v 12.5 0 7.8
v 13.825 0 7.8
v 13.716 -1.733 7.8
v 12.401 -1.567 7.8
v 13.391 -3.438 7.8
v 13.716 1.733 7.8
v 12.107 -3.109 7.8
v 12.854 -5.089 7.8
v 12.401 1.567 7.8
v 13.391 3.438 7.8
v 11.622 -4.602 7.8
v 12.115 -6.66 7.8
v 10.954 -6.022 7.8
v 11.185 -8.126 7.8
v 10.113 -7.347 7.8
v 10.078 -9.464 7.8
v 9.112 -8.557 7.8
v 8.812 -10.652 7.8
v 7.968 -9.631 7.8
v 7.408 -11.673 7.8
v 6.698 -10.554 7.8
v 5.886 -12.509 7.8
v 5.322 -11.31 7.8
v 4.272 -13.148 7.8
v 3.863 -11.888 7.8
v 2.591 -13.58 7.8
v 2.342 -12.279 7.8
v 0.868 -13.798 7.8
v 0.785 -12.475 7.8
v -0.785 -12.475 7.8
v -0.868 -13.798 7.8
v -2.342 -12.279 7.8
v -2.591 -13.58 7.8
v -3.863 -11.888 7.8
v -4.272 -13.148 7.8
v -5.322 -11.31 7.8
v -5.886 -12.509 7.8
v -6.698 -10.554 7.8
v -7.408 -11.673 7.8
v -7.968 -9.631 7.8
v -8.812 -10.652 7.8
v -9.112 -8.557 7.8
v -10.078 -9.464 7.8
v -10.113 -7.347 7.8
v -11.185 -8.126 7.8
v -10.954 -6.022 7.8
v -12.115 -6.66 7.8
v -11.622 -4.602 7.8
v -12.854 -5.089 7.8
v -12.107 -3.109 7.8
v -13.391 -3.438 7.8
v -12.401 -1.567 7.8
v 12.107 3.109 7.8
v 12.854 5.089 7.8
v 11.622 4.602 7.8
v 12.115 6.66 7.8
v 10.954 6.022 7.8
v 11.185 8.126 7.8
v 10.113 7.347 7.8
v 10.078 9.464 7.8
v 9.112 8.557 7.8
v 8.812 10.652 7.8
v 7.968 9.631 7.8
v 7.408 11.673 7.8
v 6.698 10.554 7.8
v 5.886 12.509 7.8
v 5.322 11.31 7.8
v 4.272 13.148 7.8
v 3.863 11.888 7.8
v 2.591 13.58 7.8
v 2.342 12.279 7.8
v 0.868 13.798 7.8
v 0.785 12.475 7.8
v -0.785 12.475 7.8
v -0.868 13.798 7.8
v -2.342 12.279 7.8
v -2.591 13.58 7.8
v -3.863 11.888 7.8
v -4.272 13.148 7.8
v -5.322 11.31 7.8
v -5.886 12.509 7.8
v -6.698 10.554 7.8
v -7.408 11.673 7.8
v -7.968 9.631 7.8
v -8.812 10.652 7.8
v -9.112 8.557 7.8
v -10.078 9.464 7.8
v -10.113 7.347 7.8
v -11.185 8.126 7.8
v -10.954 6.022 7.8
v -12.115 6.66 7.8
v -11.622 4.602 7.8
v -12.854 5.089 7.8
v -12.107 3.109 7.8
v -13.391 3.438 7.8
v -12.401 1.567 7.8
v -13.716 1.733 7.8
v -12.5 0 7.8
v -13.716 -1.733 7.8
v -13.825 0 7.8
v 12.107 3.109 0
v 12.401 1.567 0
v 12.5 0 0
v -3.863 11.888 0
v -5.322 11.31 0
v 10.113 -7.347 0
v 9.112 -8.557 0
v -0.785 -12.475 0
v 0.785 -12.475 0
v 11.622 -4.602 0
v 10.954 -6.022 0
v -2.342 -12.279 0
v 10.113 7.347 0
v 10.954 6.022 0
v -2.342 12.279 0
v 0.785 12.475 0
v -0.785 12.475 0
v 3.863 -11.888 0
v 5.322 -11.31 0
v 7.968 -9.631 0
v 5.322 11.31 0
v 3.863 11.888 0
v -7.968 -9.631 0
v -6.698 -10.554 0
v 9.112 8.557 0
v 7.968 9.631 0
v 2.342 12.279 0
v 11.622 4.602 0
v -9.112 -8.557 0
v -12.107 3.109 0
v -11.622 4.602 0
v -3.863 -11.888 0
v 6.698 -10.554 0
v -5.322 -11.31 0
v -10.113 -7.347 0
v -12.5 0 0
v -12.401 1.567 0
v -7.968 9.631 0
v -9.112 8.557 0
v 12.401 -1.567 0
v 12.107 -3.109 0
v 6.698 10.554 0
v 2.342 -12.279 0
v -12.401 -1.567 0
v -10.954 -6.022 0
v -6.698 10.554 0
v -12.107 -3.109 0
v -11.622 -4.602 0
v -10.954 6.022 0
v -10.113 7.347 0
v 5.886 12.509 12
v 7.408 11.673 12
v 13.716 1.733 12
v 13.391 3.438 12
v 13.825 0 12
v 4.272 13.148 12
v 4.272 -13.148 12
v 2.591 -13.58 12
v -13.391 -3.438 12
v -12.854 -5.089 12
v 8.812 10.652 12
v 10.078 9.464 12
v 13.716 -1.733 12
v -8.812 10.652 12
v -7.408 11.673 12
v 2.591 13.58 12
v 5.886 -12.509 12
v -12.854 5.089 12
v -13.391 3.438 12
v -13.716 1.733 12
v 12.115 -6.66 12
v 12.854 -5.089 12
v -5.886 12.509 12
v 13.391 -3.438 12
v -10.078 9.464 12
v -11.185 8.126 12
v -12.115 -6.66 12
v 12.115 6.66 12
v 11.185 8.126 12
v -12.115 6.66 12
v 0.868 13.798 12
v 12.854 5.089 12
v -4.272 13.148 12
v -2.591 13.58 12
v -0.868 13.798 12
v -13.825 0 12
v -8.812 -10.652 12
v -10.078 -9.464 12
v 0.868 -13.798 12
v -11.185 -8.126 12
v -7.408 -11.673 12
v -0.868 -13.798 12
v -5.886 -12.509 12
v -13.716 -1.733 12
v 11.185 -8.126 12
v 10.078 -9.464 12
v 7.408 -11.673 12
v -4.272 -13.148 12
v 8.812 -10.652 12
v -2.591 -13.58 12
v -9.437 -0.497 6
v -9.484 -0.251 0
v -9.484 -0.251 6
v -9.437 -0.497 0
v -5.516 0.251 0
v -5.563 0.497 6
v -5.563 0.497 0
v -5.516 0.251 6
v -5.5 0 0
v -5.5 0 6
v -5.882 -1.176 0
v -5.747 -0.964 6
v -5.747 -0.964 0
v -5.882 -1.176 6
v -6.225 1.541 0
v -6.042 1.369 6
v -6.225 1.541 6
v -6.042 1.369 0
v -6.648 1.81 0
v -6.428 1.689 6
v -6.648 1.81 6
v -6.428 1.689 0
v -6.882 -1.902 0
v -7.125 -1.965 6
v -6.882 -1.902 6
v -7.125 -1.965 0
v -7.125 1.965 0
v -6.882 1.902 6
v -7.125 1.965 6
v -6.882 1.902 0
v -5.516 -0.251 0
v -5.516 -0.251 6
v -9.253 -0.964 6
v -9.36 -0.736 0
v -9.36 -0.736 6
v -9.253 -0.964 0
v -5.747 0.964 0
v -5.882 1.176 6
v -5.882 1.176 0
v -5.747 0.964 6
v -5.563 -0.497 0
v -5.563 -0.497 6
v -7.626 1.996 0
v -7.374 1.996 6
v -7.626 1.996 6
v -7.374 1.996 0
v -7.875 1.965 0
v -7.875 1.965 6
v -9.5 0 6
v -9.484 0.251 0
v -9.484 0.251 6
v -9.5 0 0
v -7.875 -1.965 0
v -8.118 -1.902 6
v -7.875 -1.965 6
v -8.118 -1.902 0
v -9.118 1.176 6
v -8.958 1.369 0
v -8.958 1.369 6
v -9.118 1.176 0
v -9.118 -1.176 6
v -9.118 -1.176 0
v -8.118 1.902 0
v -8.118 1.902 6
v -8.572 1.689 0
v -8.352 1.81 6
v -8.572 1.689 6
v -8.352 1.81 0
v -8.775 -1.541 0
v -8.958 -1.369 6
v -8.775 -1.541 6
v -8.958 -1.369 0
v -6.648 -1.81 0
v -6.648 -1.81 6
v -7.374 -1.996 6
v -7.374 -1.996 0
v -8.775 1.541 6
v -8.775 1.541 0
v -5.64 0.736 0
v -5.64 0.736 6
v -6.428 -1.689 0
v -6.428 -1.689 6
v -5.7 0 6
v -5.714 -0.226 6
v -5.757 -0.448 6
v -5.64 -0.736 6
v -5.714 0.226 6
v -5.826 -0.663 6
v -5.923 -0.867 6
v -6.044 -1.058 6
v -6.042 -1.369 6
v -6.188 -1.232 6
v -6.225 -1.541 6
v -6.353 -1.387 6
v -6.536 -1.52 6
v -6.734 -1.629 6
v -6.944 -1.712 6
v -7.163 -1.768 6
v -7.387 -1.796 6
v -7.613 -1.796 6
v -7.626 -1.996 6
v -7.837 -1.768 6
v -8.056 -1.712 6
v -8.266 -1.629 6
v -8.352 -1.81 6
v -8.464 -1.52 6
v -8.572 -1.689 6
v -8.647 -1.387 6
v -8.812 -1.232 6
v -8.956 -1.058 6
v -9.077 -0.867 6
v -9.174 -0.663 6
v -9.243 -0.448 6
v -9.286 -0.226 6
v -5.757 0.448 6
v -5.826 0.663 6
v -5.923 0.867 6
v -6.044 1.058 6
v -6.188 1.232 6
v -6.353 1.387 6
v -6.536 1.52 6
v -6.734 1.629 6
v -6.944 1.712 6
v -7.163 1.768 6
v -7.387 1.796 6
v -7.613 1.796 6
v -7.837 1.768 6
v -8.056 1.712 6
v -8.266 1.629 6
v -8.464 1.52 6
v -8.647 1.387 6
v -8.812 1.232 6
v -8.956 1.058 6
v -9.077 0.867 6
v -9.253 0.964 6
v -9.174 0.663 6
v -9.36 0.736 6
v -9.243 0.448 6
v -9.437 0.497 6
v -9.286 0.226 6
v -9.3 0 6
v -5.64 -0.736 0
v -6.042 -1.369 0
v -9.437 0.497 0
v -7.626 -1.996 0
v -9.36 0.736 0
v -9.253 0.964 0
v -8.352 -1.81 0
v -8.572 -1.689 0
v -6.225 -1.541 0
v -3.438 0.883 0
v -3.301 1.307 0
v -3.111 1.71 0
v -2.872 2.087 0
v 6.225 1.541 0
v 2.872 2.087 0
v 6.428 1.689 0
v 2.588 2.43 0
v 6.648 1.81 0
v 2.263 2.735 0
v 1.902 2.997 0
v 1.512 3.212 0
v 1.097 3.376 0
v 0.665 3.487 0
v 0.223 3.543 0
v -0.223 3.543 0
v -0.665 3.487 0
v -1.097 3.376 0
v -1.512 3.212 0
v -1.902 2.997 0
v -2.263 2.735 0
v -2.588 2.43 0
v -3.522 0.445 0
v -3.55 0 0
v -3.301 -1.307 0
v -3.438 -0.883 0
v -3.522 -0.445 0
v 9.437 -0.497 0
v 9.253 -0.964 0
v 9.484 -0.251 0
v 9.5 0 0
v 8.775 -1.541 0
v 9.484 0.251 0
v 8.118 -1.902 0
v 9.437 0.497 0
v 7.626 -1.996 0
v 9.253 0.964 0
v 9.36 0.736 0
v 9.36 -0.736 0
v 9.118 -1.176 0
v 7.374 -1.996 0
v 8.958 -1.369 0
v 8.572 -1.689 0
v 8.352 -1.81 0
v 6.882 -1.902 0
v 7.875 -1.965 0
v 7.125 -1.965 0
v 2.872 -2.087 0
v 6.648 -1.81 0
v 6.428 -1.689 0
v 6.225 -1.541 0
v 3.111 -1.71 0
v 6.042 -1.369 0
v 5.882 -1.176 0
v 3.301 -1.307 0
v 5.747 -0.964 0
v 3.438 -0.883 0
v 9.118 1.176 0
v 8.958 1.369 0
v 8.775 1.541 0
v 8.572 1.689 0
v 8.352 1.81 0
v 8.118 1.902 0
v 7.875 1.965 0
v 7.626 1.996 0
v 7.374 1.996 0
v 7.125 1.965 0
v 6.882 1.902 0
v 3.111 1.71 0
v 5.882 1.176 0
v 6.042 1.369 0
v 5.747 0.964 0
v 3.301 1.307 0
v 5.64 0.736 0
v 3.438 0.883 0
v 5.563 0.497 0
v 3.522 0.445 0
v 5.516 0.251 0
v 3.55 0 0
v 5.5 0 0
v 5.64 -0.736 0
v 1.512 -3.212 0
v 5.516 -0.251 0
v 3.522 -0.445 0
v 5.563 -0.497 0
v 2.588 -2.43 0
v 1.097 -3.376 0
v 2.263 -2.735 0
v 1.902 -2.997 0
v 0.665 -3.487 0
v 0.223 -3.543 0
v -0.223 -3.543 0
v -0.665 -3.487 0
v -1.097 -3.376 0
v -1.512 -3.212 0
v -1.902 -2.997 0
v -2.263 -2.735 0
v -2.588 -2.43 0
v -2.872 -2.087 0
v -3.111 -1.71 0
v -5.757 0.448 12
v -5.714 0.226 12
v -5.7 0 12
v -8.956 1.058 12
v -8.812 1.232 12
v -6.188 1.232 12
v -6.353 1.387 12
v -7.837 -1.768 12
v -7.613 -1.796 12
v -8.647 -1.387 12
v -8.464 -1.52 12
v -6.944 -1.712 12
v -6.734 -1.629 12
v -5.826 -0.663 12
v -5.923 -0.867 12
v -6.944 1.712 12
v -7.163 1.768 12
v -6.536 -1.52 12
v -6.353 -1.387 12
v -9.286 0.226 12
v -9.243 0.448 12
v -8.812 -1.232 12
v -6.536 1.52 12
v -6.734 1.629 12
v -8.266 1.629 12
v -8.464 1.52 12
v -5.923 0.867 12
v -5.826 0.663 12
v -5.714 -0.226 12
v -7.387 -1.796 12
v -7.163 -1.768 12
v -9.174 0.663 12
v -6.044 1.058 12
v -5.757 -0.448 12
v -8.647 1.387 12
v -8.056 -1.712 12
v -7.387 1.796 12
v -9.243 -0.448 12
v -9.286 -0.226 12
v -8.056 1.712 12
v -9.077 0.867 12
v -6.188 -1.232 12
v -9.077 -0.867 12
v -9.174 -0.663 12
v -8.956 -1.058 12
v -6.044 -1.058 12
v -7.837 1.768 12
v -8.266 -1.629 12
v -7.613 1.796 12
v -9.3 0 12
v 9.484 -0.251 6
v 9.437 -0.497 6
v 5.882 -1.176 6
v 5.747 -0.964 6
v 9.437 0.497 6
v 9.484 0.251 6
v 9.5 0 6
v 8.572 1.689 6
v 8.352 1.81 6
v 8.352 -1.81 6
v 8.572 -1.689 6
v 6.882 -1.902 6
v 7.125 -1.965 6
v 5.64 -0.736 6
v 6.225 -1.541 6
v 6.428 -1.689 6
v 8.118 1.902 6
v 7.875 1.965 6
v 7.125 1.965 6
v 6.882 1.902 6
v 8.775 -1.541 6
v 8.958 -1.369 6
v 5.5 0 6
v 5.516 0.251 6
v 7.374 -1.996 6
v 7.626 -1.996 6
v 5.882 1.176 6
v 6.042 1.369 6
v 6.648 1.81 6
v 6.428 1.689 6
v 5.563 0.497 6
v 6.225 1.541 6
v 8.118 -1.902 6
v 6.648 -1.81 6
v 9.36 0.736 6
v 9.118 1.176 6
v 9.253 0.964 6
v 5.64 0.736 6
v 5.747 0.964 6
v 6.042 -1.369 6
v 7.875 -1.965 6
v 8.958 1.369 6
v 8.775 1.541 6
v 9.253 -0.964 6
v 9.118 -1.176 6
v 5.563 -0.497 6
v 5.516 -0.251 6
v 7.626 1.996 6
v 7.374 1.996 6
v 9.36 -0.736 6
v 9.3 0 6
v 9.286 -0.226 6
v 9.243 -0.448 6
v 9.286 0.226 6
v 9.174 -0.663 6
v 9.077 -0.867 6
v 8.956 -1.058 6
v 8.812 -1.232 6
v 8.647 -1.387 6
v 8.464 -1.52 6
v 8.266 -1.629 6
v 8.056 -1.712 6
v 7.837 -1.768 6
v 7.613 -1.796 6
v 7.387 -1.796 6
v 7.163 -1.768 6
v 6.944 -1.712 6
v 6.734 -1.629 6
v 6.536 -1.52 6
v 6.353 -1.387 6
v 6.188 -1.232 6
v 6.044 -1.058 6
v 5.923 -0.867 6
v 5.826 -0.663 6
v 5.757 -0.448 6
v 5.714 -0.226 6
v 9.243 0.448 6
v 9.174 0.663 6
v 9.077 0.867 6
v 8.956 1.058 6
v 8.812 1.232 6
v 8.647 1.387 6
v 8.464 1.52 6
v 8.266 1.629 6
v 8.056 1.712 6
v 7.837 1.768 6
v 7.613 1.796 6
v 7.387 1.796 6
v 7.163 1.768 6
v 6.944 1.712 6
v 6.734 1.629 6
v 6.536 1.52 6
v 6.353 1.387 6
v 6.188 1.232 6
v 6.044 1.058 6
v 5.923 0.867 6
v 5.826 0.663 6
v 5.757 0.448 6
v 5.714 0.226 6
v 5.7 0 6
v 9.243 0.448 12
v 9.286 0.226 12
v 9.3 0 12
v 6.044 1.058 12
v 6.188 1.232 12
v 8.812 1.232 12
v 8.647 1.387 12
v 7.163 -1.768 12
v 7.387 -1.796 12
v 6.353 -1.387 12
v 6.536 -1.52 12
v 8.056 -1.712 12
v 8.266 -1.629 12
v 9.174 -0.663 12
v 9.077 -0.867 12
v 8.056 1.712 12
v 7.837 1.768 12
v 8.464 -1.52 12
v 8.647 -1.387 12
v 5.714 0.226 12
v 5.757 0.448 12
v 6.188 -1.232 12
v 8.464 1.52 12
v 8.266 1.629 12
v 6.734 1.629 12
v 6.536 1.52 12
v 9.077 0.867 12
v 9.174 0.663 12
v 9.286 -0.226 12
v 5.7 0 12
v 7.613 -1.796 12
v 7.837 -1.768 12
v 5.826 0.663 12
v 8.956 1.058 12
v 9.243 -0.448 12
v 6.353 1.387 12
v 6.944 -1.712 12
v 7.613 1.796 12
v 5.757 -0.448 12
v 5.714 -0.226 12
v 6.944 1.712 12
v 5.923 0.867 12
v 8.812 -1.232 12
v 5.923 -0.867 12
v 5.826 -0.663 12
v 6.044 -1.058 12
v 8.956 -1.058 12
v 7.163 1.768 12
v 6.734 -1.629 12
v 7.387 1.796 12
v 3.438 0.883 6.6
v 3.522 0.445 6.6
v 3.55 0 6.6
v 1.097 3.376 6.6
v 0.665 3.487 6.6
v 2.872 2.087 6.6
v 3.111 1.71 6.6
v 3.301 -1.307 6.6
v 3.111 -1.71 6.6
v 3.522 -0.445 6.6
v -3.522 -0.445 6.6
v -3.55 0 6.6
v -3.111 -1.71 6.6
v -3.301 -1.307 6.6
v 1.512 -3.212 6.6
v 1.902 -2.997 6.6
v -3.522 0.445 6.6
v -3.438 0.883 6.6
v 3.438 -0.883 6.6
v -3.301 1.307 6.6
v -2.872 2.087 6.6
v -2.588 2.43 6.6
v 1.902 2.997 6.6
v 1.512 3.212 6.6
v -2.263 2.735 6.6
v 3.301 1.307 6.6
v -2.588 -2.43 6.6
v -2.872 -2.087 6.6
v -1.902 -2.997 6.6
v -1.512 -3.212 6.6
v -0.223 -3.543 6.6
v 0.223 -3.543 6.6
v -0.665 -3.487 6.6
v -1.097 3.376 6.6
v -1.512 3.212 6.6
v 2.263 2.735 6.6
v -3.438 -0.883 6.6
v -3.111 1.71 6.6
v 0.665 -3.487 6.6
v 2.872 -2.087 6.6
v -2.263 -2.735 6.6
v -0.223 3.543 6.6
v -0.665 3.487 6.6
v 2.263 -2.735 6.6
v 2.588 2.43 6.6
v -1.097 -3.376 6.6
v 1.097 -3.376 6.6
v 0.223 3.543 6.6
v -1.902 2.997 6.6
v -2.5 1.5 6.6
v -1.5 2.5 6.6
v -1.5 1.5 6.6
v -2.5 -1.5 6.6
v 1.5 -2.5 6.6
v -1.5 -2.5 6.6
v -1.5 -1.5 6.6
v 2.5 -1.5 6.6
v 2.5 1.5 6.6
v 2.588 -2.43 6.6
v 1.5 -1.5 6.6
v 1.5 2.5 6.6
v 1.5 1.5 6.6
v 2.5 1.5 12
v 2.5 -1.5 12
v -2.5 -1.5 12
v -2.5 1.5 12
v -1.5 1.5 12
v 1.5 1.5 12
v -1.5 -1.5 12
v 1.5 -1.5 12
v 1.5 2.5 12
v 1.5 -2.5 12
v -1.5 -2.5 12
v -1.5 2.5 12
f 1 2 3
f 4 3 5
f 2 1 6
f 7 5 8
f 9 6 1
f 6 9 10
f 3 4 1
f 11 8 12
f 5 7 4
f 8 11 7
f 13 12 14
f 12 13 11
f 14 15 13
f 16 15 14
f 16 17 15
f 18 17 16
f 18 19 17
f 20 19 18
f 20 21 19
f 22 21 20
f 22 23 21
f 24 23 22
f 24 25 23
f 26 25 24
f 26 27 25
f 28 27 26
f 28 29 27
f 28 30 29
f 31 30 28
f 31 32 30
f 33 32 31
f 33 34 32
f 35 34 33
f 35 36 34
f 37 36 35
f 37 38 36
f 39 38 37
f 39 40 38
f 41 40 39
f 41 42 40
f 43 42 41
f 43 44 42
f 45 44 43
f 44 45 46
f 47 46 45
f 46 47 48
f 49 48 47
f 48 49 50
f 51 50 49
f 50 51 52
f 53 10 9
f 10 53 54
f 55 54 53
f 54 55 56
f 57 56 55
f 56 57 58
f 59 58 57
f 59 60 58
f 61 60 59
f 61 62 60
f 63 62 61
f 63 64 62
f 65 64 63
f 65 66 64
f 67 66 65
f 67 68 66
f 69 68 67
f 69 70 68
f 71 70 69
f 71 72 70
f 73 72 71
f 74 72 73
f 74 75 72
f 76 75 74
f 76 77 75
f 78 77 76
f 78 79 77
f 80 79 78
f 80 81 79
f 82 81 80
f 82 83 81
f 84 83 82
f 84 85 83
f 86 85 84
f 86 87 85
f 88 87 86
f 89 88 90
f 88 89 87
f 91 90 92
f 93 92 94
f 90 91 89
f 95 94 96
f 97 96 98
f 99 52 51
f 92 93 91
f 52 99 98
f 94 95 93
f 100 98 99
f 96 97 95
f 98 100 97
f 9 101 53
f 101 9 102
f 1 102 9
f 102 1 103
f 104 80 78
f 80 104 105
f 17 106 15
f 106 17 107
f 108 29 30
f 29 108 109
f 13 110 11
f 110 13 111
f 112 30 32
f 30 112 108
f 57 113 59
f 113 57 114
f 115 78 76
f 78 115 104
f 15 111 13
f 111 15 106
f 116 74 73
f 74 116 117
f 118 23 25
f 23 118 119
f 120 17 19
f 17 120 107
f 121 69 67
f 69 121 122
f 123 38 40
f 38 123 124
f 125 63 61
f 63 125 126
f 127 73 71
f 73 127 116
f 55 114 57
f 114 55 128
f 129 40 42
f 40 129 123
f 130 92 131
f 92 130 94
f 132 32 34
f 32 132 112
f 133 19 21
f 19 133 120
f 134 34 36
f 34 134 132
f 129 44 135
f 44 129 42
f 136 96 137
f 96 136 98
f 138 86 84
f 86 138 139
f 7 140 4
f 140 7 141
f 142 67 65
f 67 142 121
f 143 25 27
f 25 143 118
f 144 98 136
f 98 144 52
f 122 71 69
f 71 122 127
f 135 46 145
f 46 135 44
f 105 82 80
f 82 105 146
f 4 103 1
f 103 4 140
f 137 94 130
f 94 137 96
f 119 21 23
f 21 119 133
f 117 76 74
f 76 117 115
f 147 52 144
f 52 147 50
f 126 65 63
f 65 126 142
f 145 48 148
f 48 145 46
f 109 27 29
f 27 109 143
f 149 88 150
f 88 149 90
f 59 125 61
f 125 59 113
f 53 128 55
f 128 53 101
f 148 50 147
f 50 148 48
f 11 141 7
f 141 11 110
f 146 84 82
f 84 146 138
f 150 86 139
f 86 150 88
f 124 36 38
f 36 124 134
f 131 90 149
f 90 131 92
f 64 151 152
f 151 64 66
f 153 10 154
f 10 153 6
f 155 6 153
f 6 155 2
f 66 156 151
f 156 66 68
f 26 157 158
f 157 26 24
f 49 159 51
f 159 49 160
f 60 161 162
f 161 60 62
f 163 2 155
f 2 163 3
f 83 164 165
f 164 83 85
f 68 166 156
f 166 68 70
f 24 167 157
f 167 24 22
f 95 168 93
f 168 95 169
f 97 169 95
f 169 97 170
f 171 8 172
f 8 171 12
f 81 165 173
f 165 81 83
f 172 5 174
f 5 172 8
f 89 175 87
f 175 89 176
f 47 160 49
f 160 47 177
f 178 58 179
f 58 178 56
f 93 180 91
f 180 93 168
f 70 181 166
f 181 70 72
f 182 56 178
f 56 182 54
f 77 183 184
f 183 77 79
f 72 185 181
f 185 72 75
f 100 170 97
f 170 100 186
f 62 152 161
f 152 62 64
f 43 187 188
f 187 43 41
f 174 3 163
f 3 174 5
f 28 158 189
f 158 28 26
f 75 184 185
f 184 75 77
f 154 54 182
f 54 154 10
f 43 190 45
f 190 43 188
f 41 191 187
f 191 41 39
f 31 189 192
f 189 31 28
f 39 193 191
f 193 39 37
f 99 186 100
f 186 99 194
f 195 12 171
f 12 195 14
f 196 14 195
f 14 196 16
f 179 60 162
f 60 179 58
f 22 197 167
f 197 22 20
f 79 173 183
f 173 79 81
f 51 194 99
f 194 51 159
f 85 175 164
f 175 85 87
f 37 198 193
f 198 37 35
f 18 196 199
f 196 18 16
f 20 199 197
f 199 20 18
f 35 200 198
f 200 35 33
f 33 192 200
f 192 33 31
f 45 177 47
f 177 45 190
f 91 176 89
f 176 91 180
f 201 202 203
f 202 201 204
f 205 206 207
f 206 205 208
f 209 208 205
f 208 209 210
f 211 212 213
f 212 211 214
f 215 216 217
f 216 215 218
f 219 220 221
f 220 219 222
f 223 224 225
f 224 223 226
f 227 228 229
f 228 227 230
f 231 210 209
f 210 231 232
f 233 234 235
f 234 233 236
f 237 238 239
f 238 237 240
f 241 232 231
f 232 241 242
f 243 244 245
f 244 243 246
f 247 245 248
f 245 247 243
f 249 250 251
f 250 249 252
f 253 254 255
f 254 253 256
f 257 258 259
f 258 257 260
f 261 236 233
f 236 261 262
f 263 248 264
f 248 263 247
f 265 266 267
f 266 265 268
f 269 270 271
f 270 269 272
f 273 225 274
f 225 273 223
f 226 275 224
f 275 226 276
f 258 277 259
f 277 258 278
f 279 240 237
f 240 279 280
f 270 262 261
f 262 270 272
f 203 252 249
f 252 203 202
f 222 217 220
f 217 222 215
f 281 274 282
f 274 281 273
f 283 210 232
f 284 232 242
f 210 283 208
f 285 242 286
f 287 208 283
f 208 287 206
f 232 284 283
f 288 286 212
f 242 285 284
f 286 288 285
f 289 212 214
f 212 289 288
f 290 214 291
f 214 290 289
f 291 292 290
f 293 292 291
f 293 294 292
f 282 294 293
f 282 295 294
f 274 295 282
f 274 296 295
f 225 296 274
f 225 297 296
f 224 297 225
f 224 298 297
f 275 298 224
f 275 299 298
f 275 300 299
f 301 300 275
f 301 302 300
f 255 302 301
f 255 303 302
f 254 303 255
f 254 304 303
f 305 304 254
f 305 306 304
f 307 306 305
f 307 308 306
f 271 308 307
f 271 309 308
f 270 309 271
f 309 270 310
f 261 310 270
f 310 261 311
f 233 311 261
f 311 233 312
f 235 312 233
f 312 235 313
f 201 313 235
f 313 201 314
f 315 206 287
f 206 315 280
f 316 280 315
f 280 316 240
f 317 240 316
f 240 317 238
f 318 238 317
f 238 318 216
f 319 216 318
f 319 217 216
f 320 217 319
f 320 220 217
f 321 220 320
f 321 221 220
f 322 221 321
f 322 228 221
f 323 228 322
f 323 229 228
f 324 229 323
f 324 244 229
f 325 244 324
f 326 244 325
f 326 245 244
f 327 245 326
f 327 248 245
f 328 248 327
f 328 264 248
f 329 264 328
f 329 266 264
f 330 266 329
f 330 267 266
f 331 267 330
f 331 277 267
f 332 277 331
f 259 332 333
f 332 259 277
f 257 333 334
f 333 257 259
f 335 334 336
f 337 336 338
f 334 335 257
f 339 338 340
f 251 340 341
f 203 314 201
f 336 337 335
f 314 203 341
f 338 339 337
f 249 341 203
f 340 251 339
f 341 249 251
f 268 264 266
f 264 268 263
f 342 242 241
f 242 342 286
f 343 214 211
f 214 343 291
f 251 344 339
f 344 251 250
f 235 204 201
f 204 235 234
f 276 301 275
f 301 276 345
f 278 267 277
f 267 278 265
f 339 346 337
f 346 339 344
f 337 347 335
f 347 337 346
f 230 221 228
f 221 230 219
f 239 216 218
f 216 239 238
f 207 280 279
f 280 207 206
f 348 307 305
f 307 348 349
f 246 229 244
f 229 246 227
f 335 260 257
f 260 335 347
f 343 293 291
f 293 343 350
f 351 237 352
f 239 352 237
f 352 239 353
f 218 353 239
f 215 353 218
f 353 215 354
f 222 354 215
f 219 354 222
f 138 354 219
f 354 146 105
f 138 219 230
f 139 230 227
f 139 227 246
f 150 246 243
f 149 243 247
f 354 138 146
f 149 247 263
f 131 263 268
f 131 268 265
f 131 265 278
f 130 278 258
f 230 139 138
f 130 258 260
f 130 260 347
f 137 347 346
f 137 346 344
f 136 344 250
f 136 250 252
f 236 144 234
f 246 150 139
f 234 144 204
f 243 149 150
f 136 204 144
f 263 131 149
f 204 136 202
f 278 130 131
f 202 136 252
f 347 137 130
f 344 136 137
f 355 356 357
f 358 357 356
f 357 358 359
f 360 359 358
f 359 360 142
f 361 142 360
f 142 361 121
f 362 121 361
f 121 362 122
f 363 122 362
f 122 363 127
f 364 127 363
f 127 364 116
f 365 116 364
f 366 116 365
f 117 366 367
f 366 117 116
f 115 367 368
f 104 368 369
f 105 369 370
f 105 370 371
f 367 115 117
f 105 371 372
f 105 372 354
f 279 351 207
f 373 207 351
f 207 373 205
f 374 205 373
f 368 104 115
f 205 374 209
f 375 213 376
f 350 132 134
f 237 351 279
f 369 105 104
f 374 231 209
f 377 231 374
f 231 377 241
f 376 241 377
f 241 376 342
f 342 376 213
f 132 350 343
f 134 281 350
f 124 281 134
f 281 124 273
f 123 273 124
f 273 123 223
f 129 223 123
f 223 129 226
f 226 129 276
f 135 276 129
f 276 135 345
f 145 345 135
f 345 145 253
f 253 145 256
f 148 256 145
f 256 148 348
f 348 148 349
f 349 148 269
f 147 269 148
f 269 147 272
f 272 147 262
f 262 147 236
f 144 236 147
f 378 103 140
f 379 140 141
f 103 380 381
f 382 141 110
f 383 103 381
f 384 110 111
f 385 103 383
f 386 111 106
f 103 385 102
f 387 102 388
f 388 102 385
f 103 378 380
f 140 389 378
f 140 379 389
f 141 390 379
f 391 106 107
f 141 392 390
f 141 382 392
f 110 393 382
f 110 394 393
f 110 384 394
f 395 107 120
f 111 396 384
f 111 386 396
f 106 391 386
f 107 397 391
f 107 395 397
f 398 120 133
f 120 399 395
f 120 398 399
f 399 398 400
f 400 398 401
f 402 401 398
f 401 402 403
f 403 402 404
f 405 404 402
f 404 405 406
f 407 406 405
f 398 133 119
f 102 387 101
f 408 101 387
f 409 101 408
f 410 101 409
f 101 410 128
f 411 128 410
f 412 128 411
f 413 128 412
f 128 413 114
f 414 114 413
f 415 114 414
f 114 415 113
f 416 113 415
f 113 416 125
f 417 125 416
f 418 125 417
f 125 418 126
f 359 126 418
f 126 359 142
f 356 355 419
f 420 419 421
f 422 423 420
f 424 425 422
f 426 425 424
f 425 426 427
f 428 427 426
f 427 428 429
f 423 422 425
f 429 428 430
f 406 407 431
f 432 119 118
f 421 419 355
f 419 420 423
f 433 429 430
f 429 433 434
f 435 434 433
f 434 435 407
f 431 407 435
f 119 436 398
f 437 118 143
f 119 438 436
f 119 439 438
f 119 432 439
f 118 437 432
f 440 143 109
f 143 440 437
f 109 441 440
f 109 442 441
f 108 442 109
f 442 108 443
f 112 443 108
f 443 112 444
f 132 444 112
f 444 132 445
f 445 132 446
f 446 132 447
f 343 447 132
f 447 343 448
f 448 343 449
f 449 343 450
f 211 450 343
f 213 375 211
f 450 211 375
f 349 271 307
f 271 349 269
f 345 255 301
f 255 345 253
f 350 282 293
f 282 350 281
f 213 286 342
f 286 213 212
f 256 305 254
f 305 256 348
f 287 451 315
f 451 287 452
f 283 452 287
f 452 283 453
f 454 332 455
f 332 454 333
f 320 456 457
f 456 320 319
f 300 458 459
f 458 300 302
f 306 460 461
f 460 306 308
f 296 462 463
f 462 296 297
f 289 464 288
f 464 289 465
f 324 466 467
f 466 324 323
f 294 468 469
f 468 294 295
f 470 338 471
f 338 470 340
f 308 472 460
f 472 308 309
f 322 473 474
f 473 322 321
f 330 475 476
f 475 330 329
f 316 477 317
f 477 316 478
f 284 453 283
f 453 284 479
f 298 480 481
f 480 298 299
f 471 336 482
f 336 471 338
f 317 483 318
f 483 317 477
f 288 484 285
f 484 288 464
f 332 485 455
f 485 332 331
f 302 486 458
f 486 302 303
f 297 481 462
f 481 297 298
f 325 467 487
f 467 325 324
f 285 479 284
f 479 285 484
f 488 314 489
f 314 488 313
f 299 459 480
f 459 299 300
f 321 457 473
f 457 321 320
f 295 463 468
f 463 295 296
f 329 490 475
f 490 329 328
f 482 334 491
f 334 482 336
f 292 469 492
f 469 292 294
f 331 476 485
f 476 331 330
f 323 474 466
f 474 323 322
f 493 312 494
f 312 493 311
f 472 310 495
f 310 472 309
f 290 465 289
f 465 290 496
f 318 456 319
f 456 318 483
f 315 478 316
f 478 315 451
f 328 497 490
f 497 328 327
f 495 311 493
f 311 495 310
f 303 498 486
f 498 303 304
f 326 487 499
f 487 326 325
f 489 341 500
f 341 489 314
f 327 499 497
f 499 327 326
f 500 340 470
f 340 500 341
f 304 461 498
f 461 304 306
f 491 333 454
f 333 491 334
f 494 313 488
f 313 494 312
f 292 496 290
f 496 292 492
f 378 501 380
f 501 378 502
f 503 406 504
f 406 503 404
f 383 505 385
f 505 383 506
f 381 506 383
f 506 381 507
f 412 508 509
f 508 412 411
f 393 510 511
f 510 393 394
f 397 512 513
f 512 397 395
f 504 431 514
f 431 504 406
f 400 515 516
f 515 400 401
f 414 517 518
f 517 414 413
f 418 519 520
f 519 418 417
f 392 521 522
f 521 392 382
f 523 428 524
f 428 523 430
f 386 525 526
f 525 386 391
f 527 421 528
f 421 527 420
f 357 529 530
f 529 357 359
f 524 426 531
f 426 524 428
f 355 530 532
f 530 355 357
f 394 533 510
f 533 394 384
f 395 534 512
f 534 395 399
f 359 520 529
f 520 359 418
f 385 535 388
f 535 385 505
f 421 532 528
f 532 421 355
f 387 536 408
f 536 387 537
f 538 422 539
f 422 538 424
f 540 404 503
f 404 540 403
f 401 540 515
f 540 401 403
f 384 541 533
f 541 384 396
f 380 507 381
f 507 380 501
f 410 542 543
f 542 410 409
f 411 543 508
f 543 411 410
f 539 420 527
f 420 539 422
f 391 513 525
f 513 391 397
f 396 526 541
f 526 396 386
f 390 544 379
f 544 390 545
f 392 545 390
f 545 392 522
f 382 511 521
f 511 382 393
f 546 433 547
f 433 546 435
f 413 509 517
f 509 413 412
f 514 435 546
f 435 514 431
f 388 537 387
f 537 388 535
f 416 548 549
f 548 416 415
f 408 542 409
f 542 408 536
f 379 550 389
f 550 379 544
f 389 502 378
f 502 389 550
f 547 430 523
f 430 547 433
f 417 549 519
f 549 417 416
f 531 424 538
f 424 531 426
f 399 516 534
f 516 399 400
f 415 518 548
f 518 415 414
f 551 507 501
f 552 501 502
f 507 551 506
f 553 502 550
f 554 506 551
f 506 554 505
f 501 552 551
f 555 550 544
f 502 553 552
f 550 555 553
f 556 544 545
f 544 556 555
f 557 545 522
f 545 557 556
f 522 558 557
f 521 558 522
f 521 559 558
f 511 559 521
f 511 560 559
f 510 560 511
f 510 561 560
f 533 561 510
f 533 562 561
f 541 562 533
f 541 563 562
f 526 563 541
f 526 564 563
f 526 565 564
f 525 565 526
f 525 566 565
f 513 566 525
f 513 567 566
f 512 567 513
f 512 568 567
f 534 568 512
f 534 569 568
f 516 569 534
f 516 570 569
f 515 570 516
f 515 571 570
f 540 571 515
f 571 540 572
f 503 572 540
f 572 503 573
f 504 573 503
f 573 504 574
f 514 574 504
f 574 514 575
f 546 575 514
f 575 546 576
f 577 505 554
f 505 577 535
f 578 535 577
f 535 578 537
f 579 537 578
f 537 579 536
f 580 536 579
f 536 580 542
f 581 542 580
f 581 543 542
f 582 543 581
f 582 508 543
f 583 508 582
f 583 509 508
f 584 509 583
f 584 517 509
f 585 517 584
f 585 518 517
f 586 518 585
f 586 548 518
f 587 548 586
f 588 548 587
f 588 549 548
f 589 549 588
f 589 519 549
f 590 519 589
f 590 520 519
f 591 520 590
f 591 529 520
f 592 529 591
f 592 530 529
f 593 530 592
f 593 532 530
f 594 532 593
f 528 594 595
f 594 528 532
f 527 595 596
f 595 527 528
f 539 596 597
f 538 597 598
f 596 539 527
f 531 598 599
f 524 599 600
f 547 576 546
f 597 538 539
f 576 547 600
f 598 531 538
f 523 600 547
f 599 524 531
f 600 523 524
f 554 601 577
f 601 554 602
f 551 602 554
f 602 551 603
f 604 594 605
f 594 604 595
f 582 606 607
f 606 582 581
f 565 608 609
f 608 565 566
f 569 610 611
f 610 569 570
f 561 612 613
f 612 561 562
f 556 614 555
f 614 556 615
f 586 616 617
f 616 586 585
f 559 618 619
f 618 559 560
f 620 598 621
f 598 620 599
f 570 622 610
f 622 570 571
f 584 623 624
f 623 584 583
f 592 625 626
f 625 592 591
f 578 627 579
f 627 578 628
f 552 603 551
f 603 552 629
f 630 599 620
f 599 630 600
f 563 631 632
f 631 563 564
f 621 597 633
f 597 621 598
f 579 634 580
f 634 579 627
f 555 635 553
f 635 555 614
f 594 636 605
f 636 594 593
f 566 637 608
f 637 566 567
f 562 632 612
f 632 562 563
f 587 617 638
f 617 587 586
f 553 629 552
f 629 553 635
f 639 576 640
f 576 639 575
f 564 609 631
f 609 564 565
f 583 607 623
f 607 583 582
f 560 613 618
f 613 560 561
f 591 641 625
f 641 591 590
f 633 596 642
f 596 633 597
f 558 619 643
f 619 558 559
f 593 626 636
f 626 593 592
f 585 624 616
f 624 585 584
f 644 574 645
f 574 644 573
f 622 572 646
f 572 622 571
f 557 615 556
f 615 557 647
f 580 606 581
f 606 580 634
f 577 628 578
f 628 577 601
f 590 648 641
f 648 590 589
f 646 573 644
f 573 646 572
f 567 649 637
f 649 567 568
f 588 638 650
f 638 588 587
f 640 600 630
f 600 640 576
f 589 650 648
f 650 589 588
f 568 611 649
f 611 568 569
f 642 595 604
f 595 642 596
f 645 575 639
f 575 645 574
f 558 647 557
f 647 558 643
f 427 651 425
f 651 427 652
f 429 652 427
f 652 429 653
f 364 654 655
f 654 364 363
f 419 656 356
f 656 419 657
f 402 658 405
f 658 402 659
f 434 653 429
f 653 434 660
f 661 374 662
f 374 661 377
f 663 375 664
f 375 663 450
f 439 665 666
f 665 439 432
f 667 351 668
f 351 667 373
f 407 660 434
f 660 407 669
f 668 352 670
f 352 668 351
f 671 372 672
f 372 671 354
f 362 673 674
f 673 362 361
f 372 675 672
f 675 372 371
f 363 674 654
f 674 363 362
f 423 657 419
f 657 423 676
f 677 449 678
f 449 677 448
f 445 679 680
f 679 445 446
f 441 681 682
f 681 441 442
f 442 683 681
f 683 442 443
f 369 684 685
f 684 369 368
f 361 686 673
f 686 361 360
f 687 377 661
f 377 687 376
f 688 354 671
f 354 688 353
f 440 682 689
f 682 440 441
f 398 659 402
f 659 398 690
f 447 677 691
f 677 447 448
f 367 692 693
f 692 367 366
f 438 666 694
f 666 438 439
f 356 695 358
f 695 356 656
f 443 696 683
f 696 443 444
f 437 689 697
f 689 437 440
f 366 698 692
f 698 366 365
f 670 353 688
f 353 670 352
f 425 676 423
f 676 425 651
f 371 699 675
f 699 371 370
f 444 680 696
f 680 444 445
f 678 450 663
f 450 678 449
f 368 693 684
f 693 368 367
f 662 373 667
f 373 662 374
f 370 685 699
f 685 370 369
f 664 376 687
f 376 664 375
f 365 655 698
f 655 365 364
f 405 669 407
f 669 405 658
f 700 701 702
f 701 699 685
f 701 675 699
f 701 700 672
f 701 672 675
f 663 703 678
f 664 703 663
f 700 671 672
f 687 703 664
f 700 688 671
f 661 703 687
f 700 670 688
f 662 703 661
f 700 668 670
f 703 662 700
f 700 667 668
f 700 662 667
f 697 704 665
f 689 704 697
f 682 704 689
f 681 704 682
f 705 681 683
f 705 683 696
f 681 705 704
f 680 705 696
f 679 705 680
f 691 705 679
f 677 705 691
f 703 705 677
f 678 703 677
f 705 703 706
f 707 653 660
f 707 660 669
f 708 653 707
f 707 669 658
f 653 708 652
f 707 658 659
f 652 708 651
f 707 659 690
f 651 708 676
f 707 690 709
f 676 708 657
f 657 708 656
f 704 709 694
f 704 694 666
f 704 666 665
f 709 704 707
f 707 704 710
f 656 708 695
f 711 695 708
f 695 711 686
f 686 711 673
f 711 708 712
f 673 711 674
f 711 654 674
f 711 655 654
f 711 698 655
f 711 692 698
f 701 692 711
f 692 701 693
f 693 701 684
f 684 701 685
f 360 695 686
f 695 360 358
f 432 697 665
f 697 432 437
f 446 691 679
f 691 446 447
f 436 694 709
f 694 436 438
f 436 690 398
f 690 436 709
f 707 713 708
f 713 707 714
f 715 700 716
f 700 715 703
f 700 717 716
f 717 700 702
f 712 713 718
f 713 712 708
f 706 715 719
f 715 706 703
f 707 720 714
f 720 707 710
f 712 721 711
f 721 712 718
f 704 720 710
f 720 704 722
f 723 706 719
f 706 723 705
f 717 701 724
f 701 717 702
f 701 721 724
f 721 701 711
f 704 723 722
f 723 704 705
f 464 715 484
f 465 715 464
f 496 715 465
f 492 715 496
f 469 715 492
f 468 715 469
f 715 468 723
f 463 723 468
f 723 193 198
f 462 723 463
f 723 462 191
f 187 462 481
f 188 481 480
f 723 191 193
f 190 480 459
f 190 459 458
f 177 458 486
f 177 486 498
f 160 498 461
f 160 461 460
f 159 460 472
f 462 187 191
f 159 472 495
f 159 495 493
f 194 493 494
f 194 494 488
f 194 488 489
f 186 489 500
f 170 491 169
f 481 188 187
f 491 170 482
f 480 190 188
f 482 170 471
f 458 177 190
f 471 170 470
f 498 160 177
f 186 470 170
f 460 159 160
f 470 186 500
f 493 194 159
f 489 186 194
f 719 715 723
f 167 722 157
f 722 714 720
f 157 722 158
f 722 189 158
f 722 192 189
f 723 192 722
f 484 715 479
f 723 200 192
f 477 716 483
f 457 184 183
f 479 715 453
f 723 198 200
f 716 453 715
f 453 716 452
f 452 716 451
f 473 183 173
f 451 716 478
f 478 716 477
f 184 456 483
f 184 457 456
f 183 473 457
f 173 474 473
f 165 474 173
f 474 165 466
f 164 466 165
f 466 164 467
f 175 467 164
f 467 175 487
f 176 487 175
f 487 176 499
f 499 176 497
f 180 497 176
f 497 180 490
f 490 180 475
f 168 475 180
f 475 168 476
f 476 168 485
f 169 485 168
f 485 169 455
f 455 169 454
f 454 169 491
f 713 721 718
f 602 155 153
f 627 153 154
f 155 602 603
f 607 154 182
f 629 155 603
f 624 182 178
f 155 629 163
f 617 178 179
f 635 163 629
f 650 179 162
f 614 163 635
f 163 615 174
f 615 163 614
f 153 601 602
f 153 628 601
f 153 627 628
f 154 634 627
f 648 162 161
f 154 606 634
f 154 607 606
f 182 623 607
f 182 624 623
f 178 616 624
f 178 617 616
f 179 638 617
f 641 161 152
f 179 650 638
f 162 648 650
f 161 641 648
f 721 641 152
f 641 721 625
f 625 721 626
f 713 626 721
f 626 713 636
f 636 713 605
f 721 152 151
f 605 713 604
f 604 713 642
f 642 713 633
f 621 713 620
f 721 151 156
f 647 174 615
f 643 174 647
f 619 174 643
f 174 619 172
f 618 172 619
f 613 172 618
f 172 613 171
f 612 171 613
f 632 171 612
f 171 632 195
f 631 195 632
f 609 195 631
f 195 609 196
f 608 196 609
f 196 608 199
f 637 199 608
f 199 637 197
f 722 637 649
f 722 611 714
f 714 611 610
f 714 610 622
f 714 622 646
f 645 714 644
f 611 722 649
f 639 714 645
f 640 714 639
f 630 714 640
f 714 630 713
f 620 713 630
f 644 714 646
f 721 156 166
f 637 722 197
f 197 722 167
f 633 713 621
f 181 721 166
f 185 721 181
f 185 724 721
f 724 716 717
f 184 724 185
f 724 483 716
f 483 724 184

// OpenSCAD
$fn = 50;

difference() {
	union() {
		translate(v = [0, 0, 0]) {
			rotate(a = [0, 0, 0]) {
				difference() {
					union() {
						translate(v = [0, 0, 6.0]) {
							rotate(a = [0, 0, 0]) {
								difference() {
									union() {
										translate(v = [0, 0, -6.0]) {
											cylinder(h = 12, r = 14.5);
										}
									}
									union() {
										translate(v = [0, 0, 0]) {
											rotate(a = [0, 0, 0]) {
												difference() {
													union() {
														translate(v = [0, 0, -1.8]) {
															cylinder(h = 3.6, r = 16.15);
														}
													}
													union() {
														translate(v = [0, 0, -1.81]) {
															cylinder(h = 3.62, r = 12.5);
														}
													}
												}
											}
										}
										translate(v = [0, 0, -3]) {
											rotate(a = [0, 0, 0]) {
												difference() {
													union() {
														translate(v = [0, 0, -1.8]) {
															cylinder(h = 3.6, r = 16.15);
														}
													}
													union() {
														translate(v = [0, 0, -1.81]) {
															cylinder(h = 3.62, r = 12.5);
														}
													}
												}
											}
										}
										translate(v = [0, 0, -6]) {
											rotate(a = [0, 0, 0]) {
												difference() {
													union() {
														translate(v = [0, 0, -1.8]) {
															cylinder(h = 3.6, r = 16.15);
														}
													}
													union() {
														translate(v = [0, 0, -1.81]) {
															cylinder(h = 3.62, r = 12.5);
														}
													}
												}
											}
										}
										translate(v = [0, 0, 0]) {
											rotate(a = [0, 0, 0]) {
												difference() {
													union() {
														translate(v = [0, 0, -21.0]) {
															cylinder(h = 42, r = 14.825);
														}
													}
													union() {
														translate(v = [0, 0, -21.01]) {
															cylinder(h = 42.02, r = 13.825);
														}
													}
												}
											}
										}
										translate(v = [-15.0, -15.0, -100.0]) {
											cylinder(h = 200, r = 3.25);
										}
										translate(v = [-15.0, 15.0, -100.0]) {
											cylinder(h = 200, r = 3.25);
										}
										translate(v = [15.0, -15.0, -100.0]) {
											cylinder(h = 200, r = 3.25);
										}
										translate(v = [15.0, 15.0, -100.0]) {
											cylinder(h = 200, r = 3.25);
										}
										translate(v = [-7.5, 0, -6.0]) {
											cylinder(h = 6, r = 2.0);
										}
										translate(v = [-7.5, 0, -7.0]) {
											cylinder(h = 14, r = 1.8);
										}
										translate(v = [7.5, 0, -6.0]) {
											cylinder(h = 6, r = 2.0);
										}
										translate(v = [7.5, 0, -7.0]) {
											cylinder(h = 14, r = 1.8);
										}
										translate(v = [0, 0, -6.000000000000001]) {
											cylinder(h = 6.6, r = 3.55);
										}
										translate(v = [-2.5, -1.5, -7.0]) {
											cube(size = [5, 3, 14]);
										}
										translate(v = [-1.5, -2.5, -7.0]) {
											cube(size = [3, 5, 14]);
										}
									}
								}
							}
						}
					}
					union();
				}
			}
		}
	}
	union();
}
